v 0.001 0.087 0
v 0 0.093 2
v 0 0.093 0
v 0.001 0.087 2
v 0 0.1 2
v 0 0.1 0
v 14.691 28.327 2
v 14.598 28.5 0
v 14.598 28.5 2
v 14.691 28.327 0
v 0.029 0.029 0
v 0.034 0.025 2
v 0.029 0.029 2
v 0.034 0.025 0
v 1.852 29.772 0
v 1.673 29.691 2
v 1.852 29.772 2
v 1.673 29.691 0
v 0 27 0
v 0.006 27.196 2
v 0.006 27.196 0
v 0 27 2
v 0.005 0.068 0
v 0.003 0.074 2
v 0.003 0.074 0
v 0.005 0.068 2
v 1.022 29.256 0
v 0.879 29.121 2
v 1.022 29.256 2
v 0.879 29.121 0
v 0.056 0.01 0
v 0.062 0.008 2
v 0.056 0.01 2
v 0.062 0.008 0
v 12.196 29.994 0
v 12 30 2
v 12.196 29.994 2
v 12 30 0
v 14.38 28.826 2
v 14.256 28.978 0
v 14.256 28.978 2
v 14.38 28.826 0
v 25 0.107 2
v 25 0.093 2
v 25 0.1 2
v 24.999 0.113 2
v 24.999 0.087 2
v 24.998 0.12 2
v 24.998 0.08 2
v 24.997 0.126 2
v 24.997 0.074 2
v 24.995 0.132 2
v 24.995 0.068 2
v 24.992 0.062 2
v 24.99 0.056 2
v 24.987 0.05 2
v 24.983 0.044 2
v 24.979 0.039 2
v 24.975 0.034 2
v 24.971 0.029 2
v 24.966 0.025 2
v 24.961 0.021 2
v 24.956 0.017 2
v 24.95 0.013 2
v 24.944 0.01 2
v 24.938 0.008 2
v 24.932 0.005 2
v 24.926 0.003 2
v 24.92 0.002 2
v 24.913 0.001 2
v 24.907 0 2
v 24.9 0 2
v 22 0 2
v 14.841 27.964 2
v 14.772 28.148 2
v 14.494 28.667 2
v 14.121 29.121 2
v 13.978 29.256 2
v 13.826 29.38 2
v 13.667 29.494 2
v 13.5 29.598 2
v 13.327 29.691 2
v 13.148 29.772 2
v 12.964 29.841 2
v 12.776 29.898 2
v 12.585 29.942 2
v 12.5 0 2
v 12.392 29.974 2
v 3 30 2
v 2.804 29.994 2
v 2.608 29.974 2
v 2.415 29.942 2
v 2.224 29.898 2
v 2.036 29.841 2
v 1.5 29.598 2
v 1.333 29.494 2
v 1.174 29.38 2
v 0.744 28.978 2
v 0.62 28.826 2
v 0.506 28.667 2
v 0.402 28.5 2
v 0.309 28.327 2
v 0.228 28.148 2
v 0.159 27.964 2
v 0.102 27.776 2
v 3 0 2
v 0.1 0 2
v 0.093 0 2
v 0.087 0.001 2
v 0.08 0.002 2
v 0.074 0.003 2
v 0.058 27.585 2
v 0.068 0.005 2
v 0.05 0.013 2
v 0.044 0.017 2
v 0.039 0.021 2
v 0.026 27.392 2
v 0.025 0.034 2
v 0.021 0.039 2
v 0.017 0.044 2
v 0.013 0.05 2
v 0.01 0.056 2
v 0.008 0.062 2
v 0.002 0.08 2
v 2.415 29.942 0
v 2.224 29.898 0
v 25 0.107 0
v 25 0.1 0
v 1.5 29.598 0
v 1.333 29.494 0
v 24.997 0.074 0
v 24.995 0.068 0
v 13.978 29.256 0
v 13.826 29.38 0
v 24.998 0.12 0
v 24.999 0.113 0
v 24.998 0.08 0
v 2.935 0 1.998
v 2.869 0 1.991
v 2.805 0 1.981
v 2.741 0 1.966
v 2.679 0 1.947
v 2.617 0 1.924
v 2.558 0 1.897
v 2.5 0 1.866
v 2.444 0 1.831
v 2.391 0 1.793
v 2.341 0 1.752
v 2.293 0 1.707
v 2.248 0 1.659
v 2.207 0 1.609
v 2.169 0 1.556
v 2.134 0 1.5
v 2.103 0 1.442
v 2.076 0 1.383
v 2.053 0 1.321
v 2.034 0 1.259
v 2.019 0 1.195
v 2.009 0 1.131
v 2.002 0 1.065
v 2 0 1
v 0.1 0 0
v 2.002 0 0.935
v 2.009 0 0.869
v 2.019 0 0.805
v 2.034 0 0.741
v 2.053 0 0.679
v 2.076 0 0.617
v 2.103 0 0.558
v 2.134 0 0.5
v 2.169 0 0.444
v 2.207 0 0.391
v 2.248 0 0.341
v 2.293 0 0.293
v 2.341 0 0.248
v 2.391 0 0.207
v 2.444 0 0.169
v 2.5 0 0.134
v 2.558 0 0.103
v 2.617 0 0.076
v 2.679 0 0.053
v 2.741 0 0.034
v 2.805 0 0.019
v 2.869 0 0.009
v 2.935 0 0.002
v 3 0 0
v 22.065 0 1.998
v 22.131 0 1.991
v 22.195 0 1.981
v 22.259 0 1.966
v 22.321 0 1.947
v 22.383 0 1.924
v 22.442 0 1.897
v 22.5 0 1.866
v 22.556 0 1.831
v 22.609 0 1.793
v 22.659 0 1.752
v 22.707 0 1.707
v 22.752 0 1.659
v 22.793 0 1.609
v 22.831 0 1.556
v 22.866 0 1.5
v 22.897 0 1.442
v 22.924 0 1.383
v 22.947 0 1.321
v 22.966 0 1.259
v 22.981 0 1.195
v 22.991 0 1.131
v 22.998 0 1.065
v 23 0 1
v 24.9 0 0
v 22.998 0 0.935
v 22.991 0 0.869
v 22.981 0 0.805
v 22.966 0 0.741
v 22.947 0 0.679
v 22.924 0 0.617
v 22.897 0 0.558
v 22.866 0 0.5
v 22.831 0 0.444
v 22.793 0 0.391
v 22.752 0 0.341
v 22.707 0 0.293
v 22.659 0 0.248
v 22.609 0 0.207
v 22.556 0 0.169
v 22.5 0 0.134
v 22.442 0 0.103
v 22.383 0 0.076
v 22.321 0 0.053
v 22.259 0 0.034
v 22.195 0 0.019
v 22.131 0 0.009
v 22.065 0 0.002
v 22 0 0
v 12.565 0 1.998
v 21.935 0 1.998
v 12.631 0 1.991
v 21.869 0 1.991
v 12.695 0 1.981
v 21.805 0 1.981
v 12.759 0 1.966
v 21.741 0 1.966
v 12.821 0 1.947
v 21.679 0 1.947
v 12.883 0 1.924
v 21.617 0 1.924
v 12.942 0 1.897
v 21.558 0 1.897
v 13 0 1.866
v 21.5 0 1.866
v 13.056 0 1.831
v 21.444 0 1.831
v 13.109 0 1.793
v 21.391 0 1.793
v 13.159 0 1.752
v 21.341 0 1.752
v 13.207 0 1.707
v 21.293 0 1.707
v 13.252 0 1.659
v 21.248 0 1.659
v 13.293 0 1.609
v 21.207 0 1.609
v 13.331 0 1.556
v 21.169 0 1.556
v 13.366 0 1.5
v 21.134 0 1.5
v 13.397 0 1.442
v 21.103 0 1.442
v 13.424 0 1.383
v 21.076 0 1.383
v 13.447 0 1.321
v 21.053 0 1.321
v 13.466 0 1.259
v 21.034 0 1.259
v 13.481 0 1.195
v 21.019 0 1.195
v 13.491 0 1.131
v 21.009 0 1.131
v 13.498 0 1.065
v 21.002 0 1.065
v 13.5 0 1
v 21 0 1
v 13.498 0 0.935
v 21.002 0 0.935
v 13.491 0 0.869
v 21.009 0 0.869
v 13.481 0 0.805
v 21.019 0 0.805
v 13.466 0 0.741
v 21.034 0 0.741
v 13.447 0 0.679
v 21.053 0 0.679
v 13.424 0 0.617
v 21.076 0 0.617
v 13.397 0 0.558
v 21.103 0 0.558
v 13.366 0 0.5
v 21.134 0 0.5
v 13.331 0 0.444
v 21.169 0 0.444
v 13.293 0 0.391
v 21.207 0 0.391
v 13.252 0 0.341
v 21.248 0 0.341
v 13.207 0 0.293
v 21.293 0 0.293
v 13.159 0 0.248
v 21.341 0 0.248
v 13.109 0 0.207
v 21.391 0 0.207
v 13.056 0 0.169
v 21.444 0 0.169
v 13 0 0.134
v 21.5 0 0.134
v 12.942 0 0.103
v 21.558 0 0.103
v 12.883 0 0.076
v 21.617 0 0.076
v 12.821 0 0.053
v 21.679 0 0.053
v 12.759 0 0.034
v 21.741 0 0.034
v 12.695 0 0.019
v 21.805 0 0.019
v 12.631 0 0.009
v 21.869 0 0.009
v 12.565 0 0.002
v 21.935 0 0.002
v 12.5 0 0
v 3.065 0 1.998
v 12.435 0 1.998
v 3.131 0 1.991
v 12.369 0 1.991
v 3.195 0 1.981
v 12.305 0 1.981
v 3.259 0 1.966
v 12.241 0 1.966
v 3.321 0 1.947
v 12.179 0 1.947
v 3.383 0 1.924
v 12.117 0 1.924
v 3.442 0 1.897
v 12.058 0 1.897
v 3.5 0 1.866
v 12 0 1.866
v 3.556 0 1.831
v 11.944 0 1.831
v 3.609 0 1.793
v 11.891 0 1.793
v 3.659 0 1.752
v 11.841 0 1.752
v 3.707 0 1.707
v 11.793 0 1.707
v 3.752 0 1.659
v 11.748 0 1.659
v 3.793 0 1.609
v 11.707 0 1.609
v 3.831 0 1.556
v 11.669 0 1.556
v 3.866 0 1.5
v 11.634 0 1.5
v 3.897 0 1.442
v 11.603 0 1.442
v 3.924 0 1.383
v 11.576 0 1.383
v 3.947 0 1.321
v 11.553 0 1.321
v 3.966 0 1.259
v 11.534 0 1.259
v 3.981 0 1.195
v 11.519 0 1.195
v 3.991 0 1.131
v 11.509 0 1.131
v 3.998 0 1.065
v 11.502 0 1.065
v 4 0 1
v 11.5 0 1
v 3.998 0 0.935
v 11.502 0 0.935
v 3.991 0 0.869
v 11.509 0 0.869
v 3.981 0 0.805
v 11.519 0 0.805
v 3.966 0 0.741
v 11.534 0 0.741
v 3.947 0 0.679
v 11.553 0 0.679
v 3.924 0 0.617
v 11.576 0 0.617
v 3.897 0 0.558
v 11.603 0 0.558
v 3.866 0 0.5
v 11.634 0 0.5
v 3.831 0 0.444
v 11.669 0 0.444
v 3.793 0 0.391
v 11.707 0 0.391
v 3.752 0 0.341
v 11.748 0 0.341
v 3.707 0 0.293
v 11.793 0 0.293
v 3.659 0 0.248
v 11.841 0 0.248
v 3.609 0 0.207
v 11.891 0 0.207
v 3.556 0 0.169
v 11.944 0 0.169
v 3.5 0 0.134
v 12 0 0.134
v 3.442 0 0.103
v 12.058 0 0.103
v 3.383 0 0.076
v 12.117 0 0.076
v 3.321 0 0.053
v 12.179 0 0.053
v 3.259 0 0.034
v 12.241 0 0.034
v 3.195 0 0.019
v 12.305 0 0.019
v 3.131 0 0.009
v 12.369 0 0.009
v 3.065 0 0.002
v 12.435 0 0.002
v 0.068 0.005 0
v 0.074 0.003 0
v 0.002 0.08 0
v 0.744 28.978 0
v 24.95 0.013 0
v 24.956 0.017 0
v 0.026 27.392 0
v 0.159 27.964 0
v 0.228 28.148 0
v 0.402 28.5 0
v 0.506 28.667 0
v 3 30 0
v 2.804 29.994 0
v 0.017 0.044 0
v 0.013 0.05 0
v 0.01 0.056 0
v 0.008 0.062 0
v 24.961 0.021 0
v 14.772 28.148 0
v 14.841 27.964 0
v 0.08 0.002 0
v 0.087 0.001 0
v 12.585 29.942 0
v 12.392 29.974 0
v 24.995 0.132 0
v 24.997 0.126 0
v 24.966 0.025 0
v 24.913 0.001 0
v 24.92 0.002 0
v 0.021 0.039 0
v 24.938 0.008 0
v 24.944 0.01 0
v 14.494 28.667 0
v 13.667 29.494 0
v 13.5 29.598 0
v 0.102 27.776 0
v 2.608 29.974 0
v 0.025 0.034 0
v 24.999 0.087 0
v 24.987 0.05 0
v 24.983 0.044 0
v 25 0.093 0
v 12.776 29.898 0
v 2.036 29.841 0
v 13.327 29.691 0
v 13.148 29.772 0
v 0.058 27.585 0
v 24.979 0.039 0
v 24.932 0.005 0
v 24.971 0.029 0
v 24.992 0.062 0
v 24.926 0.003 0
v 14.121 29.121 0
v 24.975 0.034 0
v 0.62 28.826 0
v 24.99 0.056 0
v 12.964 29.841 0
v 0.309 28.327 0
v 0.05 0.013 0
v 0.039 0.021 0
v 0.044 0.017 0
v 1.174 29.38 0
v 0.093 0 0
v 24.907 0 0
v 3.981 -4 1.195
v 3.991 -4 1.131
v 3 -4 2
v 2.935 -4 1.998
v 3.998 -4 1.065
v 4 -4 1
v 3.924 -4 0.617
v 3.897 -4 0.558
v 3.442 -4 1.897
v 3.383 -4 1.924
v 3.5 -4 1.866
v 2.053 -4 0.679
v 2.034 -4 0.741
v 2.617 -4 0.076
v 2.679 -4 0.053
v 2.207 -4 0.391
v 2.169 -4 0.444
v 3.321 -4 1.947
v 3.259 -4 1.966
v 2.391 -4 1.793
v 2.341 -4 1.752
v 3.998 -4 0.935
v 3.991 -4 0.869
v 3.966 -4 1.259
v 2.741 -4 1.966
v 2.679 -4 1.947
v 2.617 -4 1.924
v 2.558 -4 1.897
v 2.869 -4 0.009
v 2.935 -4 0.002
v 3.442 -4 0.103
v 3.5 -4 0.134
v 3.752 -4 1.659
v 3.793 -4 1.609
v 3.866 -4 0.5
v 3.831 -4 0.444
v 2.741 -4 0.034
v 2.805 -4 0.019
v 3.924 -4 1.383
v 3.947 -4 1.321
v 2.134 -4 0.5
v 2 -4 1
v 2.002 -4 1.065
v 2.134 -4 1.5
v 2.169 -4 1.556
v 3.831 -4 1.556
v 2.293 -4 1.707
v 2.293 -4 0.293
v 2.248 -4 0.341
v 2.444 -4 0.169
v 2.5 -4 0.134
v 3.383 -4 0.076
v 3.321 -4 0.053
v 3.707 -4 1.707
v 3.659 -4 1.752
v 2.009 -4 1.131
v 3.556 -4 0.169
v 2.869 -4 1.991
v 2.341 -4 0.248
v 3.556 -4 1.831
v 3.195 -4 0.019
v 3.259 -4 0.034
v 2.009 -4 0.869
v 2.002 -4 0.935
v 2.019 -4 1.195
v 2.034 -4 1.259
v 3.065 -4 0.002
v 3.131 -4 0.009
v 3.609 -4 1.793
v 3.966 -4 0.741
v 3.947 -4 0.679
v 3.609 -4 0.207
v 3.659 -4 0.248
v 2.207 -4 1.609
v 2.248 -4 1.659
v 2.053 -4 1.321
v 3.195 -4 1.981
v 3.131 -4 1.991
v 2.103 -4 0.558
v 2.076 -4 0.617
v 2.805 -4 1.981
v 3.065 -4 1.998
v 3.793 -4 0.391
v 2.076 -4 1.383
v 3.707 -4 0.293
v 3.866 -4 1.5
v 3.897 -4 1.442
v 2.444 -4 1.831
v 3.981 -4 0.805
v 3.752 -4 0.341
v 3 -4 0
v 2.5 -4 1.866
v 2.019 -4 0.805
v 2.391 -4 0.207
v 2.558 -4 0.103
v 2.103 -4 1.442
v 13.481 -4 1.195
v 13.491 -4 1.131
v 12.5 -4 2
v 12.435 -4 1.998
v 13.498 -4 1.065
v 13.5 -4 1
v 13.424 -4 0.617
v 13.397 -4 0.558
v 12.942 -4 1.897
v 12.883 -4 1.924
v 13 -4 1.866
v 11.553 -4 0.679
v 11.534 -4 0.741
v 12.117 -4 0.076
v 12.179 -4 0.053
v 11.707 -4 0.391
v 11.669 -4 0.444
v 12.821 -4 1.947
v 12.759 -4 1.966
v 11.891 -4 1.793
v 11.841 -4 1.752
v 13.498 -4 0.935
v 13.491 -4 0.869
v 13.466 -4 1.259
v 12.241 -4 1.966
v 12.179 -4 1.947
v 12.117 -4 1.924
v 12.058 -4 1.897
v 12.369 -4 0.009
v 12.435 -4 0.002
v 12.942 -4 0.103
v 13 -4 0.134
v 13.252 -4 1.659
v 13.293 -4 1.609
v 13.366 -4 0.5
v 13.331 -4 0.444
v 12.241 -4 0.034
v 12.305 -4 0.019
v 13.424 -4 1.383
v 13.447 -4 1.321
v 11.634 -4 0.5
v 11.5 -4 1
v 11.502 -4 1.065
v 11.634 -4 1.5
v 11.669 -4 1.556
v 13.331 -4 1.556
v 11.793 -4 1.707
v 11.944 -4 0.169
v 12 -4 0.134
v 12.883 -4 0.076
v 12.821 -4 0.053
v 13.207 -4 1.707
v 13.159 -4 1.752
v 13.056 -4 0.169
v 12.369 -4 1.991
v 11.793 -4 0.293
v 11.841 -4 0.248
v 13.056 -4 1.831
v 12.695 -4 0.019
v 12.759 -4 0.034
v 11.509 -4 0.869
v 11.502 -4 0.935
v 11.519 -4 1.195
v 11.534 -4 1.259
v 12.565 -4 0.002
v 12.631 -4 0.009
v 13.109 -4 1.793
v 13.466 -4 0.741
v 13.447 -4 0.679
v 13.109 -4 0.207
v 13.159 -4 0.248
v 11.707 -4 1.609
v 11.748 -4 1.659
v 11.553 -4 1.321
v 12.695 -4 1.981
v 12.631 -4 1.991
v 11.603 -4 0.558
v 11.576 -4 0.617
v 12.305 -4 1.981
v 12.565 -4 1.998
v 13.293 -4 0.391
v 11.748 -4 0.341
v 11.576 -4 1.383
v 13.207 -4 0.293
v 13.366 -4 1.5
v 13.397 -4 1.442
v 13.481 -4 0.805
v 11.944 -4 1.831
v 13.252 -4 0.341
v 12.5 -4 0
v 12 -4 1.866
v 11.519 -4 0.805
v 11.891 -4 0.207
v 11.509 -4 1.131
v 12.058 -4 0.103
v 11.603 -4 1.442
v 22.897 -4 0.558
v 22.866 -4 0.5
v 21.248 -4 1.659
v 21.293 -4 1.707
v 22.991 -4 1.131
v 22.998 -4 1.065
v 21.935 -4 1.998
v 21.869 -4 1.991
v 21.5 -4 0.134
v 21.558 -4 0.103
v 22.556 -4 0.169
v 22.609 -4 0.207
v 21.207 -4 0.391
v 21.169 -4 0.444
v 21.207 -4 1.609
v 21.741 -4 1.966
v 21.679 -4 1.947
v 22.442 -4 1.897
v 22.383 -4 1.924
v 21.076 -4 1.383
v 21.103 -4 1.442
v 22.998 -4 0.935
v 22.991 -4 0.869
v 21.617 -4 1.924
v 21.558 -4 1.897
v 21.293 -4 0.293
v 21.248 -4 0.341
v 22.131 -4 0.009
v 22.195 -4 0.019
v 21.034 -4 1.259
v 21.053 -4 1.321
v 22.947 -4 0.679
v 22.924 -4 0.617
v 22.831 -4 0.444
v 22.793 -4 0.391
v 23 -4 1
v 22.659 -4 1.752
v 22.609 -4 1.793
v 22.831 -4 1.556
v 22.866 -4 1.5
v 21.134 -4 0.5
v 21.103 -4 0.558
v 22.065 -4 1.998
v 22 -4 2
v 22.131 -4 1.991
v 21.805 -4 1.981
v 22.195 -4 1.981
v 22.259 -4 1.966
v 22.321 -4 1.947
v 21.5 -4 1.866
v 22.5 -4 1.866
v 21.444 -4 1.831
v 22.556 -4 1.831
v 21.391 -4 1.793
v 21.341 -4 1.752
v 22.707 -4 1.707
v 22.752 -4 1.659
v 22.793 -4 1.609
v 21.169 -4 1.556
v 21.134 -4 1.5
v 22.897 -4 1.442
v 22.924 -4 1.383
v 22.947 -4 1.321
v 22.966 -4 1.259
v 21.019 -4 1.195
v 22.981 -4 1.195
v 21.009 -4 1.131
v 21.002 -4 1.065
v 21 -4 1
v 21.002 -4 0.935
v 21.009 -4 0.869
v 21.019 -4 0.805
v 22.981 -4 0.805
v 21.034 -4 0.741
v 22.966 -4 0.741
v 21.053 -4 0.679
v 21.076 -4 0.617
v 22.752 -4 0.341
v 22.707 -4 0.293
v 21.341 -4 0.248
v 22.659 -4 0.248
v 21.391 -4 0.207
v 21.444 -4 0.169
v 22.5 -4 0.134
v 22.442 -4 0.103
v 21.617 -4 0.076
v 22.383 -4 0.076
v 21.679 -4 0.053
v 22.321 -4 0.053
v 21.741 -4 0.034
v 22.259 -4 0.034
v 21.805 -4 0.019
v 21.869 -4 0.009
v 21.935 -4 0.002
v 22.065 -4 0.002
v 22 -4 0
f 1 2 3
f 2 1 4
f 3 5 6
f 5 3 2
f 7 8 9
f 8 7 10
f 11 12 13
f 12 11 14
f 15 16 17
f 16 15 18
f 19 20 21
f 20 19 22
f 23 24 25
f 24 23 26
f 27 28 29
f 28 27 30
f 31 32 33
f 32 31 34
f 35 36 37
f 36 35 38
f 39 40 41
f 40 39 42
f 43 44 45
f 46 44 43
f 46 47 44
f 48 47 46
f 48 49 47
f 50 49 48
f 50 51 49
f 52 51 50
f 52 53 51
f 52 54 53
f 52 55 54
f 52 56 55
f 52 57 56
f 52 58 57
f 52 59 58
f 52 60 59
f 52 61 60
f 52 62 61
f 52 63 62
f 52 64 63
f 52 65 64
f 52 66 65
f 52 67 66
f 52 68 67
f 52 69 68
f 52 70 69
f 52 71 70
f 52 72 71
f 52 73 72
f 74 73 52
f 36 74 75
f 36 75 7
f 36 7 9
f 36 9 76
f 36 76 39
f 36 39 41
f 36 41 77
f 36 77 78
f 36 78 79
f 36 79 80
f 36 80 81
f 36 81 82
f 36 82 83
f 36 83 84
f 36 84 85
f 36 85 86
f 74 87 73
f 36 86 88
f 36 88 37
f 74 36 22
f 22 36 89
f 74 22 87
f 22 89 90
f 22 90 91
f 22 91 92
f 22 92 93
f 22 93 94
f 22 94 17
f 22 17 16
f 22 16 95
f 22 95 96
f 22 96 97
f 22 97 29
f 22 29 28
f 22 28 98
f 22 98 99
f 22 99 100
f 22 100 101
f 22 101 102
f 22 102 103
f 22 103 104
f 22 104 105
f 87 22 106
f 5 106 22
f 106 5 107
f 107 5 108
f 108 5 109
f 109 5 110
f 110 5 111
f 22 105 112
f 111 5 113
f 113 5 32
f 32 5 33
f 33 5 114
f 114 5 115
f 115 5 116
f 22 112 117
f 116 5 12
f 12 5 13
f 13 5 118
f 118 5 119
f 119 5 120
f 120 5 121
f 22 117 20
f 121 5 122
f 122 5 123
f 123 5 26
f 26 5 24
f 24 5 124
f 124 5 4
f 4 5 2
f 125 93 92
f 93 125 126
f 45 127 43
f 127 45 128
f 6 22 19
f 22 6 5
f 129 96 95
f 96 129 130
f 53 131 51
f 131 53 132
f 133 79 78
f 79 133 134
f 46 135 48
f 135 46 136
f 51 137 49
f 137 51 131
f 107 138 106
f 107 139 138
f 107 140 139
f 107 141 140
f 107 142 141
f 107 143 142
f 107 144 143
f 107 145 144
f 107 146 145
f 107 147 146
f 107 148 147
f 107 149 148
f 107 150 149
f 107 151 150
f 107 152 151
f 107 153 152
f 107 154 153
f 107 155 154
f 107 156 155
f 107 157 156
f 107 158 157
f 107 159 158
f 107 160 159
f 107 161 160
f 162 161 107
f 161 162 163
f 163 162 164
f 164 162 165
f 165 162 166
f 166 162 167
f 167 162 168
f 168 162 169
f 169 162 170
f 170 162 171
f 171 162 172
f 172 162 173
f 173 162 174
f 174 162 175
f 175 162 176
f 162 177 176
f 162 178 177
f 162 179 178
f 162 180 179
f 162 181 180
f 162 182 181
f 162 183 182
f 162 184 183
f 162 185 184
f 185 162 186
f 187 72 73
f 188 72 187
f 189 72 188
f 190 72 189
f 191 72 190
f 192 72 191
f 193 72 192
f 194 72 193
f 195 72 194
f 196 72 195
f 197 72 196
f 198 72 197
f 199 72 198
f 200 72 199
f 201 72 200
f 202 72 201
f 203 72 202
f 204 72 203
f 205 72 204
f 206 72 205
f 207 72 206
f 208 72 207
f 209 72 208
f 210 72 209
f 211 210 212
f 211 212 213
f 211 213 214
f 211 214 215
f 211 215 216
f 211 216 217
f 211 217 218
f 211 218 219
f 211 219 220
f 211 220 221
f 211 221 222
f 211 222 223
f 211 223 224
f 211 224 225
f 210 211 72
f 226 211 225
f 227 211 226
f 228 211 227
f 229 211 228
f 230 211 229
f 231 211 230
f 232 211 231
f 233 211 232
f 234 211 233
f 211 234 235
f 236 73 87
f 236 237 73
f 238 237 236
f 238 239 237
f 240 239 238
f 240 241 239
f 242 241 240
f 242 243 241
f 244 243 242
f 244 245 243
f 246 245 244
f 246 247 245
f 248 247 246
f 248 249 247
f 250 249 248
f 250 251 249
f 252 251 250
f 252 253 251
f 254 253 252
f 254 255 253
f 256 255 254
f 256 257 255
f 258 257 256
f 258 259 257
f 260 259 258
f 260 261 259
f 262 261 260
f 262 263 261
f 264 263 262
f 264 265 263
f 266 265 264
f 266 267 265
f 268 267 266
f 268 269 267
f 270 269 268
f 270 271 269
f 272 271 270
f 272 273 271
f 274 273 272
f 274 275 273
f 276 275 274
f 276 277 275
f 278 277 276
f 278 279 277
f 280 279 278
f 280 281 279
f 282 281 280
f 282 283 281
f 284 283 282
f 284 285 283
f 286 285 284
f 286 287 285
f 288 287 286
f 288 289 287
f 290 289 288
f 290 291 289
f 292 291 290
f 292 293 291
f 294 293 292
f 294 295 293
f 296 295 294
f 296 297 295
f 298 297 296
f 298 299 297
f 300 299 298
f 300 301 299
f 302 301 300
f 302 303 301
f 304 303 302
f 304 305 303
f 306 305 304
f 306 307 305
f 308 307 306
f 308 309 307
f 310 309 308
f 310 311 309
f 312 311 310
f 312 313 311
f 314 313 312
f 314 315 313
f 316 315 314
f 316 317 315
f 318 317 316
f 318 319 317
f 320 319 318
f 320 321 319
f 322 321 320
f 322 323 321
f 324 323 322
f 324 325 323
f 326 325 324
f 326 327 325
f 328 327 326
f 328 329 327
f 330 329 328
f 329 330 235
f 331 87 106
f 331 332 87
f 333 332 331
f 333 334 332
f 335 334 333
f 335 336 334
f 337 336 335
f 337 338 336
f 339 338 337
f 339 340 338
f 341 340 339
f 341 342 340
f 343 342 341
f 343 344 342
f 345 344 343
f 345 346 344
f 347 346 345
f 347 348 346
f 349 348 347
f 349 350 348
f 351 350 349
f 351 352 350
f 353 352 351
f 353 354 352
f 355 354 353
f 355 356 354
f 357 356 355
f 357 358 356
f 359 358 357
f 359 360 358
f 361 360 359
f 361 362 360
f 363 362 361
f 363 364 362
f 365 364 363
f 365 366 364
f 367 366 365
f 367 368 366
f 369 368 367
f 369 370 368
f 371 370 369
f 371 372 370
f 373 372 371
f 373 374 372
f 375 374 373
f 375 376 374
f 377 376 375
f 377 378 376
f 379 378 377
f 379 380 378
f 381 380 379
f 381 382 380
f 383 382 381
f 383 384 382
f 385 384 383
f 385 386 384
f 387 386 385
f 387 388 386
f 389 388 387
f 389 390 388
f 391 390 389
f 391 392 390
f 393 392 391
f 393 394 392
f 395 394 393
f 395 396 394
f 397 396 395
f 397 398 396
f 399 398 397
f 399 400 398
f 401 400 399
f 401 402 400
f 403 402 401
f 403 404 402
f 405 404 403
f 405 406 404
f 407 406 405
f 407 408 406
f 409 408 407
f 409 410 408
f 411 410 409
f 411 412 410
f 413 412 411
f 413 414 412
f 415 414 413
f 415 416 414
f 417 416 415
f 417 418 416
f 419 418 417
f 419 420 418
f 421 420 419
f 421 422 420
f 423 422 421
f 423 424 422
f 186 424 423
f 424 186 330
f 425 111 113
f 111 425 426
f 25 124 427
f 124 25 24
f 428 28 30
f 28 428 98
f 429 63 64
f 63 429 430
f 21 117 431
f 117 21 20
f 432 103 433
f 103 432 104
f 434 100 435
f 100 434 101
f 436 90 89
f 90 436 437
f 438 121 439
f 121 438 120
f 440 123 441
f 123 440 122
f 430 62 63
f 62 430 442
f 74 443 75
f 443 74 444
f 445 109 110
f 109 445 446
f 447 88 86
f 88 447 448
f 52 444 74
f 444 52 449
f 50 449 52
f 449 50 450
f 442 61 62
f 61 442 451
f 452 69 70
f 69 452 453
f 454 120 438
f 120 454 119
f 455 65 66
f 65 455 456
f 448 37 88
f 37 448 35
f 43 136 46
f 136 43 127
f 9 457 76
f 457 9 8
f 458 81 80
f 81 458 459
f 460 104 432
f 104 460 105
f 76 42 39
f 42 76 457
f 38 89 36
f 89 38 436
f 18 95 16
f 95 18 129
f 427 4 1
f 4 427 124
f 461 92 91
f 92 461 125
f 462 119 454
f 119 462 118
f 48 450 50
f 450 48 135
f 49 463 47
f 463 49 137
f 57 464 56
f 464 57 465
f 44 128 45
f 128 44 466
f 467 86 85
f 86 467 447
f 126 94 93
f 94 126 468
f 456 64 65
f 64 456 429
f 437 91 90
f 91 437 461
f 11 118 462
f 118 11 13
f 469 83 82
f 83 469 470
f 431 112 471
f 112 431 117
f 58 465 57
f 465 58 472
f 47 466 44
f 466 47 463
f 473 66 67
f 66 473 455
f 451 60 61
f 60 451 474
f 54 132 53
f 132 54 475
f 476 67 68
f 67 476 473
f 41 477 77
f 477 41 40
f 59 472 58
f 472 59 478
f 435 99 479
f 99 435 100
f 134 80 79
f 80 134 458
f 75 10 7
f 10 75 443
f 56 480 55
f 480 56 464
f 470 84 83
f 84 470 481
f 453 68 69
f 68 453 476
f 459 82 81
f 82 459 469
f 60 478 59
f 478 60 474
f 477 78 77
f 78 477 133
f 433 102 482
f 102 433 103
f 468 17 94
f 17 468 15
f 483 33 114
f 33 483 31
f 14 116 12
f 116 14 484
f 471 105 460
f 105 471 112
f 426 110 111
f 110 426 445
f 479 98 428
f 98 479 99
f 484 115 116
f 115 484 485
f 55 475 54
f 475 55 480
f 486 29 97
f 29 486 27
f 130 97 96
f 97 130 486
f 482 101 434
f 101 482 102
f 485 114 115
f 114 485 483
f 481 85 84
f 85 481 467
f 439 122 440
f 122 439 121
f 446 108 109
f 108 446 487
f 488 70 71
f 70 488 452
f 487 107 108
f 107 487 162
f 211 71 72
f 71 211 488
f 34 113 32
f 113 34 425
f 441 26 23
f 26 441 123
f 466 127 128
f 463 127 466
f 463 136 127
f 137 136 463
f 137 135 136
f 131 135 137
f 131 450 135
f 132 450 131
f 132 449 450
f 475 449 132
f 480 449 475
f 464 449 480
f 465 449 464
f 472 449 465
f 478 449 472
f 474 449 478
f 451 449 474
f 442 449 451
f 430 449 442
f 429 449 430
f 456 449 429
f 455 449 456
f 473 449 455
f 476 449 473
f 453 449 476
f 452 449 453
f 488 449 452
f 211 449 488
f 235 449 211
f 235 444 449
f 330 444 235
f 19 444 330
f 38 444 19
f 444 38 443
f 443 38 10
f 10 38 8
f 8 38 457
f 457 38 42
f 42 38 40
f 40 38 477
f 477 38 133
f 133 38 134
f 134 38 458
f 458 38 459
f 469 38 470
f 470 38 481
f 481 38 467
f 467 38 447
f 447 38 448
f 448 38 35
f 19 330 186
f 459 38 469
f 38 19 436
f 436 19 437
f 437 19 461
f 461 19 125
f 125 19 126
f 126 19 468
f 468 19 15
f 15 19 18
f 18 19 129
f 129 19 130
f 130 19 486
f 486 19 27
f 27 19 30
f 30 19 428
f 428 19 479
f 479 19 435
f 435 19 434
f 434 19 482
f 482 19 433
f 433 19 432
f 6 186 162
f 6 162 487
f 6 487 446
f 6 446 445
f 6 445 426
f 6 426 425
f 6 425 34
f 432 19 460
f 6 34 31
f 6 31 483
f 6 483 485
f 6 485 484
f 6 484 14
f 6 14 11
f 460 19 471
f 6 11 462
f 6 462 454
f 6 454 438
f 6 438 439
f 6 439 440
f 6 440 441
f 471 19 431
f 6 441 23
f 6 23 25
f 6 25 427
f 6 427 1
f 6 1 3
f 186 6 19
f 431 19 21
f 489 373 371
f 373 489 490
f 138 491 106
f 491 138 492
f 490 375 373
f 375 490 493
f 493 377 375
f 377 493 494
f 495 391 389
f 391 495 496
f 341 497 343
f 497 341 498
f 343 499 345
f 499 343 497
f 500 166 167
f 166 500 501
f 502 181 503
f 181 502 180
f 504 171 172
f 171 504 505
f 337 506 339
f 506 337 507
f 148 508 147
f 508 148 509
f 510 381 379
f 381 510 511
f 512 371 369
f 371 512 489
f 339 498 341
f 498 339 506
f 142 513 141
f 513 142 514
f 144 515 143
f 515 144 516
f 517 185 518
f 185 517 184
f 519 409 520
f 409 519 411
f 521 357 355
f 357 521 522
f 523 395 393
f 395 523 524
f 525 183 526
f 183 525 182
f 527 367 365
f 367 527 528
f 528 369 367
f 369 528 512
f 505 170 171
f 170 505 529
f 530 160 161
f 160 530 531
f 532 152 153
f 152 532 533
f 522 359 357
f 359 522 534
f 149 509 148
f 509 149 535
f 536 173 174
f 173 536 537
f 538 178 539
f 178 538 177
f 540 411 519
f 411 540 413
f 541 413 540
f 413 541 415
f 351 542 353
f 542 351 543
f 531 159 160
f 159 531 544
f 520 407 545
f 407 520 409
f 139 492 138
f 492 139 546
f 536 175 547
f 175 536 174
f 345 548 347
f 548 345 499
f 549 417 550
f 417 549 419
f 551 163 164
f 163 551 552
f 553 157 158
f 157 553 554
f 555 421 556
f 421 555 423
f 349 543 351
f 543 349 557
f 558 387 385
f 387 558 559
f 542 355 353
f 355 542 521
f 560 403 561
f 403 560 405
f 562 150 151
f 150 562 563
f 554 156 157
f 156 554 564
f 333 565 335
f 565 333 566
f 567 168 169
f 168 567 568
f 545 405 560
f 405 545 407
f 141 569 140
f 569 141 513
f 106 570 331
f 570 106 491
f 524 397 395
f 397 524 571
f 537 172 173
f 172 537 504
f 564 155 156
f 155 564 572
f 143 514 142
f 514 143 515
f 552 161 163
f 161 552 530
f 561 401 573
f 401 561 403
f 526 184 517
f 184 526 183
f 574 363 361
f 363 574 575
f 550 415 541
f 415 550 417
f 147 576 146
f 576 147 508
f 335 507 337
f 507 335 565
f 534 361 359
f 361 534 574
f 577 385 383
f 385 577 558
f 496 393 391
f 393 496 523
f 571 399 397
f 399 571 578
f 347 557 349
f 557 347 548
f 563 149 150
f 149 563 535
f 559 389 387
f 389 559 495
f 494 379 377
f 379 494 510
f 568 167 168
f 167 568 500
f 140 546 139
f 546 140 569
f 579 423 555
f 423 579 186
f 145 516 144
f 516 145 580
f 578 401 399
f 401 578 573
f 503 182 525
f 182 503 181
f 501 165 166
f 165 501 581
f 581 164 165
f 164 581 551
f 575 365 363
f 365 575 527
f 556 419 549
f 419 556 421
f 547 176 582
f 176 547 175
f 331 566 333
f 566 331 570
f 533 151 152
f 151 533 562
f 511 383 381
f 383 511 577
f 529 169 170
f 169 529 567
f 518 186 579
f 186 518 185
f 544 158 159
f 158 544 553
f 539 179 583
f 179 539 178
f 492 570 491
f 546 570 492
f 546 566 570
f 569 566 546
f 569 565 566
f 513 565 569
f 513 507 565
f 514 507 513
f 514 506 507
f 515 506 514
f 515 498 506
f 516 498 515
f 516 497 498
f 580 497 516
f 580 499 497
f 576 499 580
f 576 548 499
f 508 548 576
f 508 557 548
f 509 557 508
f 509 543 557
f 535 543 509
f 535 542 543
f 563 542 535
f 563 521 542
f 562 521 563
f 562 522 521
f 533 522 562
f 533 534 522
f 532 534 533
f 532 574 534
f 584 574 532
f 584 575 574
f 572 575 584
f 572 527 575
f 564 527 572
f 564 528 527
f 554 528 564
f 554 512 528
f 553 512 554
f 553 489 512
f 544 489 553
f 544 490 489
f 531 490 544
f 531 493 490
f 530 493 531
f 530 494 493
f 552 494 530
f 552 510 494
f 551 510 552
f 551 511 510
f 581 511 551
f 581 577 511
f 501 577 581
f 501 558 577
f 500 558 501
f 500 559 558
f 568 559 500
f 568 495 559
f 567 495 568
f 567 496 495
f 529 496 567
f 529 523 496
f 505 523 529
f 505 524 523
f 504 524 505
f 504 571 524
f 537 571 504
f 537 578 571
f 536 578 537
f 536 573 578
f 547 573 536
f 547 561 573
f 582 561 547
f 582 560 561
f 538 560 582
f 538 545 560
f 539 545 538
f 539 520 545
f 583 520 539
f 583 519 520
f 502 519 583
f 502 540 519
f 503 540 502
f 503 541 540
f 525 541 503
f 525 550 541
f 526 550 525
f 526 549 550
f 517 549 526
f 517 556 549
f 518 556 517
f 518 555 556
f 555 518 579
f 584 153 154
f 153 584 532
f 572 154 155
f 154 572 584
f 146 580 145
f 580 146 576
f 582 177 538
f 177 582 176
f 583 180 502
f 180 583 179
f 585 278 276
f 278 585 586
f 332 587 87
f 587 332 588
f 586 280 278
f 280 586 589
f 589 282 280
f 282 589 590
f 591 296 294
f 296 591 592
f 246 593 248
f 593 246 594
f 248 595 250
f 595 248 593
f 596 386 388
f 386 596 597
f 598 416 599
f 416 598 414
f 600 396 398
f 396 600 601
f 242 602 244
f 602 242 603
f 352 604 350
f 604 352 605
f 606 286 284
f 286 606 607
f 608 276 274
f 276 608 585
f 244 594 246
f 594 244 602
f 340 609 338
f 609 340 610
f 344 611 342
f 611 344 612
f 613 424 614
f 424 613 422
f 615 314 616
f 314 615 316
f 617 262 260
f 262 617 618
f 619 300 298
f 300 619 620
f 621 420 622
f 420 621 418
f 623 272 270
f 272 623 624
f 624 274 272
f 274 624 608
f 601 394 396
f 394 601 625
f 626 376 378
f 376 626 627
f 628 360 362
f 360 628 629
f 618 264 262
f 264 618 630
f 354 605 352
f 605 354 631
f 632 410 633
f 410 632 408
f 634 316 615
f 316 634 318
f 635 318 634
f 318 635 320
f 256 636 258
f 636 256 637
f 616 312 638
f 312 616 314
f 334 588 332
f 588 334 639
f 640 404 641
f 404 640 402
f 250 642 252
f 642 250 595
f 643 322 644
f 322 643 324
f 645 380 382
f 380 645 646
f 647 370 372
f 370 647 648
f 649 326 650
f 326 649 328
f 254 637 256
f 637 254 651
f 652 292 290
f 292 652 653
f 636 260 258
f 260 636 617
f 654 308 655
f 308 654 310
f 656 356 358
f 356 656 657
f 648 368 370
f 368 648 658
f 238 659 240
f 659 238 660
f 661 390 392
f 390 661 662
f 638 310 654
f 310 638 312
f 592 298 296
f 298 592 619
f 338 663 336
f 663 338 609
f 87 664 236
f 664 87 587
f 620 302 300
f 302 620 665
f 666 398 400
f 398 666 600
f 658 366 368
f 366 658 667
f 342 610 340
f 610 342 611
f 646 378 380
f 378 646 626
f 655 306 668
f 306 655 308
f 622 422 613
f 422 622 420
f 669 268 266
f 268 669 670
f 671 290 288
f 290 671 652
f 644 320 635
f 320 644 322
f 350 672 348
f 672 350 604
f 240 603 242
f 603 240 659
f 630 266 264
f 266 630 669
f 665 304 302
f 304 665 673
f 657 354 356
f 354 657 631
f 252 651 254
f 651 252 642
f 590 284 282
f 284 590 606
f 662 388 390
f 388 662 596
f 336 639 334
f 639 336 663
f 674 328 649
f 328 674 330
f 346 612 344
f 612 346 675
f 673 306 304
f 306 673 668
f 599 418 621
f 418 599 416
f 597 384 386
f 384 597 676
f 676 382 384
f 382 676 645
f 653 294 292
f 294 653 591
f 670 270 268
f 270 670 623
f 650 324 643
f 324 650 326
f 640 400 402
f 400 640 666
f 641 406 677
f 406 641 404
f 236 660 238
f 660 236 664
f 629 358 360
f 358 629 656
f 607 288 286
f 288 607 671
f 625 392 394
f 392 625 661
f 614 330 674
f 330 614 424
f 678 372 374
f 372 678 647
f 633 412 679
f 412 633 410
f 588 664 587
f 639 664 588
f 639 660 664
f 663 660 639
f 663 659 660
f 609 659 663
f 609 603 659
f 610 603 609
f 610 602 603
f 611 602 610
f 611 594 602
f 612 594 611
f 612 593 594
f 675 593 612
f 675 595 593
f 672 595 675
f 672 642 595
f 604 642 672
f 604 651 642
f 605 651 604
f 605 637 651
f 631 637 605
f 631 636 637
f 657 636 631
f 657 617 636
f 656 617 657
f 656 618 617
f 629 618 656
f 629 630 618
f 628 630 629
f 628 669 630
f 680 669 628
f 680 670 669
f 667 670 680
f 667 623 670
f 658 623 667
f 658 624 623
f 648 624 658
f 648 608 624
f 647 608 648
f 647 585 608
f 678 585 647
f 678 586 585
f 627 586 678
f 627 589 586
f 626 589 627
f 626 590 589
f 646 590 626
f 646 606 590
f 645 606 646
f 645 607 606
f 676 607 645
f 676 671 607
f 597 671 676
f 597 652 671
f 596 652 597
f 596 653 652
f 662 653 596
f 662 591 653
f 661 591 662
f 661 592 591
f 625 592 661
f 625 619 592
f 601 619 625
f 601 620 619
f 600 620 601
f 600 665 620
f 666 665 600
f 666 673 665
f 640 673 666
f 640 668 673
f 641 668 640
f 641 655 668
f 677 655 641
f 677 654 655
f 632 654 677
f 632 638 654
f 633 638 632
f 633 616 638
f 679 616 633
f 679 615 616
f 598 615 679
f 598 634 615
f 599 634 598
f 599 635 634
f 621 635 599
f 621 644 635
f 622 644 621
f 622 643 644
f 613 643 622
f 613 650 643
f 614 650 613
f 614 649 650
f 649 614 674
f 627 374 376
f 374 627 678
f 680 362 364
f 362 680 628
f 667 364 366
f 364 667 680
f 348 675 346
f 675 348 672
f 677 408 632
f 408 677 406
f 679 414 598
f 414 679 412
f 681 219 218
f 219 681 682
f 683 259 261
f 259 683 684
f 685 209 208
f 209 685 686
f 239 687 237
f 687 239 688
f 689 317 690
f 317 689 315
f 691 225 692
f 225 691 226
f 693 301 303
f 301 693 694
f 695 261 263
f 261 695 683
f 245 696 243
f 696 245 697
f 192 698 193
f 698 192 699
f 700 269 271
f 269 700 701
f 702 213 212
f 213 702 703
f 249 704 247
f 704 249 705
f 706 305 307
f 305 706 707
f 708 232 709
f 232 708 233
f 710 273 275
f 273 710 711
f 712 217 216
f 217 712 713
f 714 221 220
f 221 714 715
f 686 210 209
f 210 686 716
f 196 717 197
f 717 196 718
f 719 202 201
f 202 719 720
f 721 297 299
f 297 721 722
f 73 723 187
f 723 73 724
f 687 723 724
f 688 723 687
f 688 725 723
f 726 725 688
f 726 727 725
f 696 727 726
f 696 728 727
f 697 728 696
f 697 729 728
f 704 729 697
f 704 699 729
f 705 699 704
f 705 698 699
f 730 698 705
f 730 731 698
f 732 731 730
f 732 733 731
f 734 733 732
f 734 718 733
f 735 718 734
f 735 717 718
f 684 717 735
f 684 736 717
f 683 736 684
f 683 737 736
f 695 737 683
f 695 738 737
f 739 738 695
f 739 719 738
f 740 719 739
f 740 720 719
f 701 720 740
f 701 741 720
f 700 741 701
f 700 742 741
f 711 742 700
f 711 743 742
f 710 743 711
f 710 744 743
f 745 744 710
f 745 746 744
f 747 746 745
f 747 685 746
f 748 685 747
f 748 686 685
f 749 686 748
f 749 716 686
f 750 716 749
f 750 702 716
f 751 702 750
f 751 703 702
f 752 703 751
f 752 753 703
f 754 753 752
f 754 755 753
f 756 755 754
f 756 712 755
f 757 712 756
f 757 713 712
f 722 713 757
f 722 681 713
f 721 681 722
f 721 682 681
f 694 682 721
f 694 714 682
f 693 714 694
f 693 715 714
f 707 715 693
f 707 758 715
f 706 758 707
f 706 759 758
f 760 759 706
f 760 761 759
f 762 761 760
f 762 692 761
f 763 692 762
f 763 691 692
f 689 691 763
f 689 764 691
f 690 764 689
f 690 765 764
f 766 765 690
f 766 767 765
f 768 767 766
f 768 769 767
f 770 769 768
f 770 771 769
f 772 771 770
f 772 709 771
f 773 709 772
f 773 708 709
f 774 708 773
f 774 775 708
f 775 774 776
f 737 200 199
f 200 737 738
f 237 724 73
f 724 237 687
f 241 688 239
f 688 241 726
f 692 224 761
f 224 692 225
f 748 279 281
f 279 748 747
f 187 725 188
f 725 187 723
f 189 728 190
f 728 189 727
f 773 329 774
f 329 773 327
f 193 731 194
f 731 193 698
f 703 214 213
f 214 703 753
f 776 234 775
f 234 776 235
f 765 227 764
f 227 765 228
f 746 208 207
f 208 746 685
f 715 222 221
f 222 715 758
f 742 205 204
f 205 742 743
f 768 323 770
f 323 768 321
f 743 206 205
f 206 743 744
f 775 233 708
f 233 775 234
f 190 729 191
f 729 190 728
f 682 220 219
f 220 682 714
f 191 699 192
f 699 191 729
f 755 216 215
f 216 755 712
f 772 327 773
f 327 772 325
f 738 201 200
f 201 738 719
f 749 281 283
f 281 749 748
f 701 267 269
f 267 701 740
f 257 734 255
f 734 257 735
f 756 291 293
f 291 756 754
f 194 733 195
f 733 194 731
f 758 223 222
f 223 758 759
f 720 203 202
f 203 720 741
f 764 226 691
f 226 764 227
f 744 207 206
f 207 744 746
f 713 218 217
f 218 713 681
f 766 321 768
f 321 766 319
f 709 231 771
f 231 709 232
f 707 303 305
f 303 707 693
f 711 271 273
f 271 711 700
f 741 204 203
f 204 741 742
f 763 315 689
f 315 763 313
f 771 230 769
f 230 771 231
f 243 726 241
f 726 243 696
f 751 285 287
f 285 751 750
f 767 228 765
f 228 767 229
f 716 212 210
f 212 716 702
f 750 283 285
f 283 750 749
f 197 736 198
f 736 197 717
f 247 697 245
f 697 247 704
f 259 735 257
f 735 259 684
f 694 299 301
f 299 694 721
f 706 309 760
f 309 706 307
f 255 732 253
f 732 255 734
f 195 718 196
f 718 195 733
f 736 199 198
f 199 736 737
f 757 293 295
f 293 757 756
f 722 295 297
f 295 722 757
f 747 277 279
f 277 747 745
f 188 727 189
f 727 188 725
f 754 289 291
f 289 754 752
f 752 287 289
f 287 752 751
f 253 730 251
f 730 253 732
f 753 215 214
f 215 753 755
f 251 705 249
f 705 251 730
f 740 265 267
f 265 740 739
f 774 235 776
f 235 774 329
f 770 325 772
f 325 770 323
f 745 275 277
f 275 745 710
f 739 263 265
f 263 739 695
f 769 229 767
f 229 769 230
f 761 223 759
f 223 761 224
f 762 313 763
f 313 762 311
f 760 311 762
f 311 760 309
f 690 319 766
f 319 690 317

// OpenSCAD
// Simple glider.

// Copyright (C) 2015 Embecosm Limited (www.embecosm.com)

// Contributor: Jeremy Bennett <jeremy.bennett@embecosm.com>

// This file is licensed under the Creative Commons Attribution-ShareAlike 3.0
// Unported License. To view a copy of this license, visit
// http://creativecommons.org/licenses/by-sa/3.0/ or send a letter to Creative
// Commons, PO Box 1866, Mountain View, CA 94042, USA.


// A very simple hand thrown glider for indoor use.

// This is the rudder.  Print with very low fill density in something like
// HIPS for low weight.


// Useful constants
corner_r =  3;
micro_r  =  0.1;
rudder_z =  2;
max_x    = 25;
min_x    = 15;
max_y    = 30;

// Smooth corners
$fn      = 96;

// 2D outline, which we'll later extrude.
module rudder_2d () {
    hull () {
        translate (v = [micro_r, micro_r, 0])
            circle (r = micro_r);
        translate (v = [max_x - micro_r, micro_r, 0])
            circle (r = micro_r);
        translate (v = [min_x - corner_r, max_y - corner_r, 0])
            circle (r = corner_r);
        translate (v = [corner_r, max_y - corner_r, 0])
            circle (r = corner_r);
    }
}


// 3D rudder
module rudder_3d () {
    linear_extrude (height = rudder_z, slices = 1, convexity = 1)
        rudder_2d ();
}


// Pegs to attach to fuselage
module rudder () {
    union () {
        rudder_3d ();
        translate (v = [3, 0, rudder_z / 2])
            rotate (a = [90, 0, 0])
                cylinder (r = rudder_z / 2, h = 4 * 2, center = true);
        translate (v = [12.5, 0, rudder_z / 2])
            rotate (a = [90, 0, 0])
                cylinder (r = rudder_z / 2, h = 4 * 2, center = true);
        translate (v = [25 - 3, 0, rudder_z / 2])
            rotate (a = [90, 0, 0])
                cylinder (r = rudder_z / 2, h = 4 * 2, center = true);
    }
}

rudder ();
